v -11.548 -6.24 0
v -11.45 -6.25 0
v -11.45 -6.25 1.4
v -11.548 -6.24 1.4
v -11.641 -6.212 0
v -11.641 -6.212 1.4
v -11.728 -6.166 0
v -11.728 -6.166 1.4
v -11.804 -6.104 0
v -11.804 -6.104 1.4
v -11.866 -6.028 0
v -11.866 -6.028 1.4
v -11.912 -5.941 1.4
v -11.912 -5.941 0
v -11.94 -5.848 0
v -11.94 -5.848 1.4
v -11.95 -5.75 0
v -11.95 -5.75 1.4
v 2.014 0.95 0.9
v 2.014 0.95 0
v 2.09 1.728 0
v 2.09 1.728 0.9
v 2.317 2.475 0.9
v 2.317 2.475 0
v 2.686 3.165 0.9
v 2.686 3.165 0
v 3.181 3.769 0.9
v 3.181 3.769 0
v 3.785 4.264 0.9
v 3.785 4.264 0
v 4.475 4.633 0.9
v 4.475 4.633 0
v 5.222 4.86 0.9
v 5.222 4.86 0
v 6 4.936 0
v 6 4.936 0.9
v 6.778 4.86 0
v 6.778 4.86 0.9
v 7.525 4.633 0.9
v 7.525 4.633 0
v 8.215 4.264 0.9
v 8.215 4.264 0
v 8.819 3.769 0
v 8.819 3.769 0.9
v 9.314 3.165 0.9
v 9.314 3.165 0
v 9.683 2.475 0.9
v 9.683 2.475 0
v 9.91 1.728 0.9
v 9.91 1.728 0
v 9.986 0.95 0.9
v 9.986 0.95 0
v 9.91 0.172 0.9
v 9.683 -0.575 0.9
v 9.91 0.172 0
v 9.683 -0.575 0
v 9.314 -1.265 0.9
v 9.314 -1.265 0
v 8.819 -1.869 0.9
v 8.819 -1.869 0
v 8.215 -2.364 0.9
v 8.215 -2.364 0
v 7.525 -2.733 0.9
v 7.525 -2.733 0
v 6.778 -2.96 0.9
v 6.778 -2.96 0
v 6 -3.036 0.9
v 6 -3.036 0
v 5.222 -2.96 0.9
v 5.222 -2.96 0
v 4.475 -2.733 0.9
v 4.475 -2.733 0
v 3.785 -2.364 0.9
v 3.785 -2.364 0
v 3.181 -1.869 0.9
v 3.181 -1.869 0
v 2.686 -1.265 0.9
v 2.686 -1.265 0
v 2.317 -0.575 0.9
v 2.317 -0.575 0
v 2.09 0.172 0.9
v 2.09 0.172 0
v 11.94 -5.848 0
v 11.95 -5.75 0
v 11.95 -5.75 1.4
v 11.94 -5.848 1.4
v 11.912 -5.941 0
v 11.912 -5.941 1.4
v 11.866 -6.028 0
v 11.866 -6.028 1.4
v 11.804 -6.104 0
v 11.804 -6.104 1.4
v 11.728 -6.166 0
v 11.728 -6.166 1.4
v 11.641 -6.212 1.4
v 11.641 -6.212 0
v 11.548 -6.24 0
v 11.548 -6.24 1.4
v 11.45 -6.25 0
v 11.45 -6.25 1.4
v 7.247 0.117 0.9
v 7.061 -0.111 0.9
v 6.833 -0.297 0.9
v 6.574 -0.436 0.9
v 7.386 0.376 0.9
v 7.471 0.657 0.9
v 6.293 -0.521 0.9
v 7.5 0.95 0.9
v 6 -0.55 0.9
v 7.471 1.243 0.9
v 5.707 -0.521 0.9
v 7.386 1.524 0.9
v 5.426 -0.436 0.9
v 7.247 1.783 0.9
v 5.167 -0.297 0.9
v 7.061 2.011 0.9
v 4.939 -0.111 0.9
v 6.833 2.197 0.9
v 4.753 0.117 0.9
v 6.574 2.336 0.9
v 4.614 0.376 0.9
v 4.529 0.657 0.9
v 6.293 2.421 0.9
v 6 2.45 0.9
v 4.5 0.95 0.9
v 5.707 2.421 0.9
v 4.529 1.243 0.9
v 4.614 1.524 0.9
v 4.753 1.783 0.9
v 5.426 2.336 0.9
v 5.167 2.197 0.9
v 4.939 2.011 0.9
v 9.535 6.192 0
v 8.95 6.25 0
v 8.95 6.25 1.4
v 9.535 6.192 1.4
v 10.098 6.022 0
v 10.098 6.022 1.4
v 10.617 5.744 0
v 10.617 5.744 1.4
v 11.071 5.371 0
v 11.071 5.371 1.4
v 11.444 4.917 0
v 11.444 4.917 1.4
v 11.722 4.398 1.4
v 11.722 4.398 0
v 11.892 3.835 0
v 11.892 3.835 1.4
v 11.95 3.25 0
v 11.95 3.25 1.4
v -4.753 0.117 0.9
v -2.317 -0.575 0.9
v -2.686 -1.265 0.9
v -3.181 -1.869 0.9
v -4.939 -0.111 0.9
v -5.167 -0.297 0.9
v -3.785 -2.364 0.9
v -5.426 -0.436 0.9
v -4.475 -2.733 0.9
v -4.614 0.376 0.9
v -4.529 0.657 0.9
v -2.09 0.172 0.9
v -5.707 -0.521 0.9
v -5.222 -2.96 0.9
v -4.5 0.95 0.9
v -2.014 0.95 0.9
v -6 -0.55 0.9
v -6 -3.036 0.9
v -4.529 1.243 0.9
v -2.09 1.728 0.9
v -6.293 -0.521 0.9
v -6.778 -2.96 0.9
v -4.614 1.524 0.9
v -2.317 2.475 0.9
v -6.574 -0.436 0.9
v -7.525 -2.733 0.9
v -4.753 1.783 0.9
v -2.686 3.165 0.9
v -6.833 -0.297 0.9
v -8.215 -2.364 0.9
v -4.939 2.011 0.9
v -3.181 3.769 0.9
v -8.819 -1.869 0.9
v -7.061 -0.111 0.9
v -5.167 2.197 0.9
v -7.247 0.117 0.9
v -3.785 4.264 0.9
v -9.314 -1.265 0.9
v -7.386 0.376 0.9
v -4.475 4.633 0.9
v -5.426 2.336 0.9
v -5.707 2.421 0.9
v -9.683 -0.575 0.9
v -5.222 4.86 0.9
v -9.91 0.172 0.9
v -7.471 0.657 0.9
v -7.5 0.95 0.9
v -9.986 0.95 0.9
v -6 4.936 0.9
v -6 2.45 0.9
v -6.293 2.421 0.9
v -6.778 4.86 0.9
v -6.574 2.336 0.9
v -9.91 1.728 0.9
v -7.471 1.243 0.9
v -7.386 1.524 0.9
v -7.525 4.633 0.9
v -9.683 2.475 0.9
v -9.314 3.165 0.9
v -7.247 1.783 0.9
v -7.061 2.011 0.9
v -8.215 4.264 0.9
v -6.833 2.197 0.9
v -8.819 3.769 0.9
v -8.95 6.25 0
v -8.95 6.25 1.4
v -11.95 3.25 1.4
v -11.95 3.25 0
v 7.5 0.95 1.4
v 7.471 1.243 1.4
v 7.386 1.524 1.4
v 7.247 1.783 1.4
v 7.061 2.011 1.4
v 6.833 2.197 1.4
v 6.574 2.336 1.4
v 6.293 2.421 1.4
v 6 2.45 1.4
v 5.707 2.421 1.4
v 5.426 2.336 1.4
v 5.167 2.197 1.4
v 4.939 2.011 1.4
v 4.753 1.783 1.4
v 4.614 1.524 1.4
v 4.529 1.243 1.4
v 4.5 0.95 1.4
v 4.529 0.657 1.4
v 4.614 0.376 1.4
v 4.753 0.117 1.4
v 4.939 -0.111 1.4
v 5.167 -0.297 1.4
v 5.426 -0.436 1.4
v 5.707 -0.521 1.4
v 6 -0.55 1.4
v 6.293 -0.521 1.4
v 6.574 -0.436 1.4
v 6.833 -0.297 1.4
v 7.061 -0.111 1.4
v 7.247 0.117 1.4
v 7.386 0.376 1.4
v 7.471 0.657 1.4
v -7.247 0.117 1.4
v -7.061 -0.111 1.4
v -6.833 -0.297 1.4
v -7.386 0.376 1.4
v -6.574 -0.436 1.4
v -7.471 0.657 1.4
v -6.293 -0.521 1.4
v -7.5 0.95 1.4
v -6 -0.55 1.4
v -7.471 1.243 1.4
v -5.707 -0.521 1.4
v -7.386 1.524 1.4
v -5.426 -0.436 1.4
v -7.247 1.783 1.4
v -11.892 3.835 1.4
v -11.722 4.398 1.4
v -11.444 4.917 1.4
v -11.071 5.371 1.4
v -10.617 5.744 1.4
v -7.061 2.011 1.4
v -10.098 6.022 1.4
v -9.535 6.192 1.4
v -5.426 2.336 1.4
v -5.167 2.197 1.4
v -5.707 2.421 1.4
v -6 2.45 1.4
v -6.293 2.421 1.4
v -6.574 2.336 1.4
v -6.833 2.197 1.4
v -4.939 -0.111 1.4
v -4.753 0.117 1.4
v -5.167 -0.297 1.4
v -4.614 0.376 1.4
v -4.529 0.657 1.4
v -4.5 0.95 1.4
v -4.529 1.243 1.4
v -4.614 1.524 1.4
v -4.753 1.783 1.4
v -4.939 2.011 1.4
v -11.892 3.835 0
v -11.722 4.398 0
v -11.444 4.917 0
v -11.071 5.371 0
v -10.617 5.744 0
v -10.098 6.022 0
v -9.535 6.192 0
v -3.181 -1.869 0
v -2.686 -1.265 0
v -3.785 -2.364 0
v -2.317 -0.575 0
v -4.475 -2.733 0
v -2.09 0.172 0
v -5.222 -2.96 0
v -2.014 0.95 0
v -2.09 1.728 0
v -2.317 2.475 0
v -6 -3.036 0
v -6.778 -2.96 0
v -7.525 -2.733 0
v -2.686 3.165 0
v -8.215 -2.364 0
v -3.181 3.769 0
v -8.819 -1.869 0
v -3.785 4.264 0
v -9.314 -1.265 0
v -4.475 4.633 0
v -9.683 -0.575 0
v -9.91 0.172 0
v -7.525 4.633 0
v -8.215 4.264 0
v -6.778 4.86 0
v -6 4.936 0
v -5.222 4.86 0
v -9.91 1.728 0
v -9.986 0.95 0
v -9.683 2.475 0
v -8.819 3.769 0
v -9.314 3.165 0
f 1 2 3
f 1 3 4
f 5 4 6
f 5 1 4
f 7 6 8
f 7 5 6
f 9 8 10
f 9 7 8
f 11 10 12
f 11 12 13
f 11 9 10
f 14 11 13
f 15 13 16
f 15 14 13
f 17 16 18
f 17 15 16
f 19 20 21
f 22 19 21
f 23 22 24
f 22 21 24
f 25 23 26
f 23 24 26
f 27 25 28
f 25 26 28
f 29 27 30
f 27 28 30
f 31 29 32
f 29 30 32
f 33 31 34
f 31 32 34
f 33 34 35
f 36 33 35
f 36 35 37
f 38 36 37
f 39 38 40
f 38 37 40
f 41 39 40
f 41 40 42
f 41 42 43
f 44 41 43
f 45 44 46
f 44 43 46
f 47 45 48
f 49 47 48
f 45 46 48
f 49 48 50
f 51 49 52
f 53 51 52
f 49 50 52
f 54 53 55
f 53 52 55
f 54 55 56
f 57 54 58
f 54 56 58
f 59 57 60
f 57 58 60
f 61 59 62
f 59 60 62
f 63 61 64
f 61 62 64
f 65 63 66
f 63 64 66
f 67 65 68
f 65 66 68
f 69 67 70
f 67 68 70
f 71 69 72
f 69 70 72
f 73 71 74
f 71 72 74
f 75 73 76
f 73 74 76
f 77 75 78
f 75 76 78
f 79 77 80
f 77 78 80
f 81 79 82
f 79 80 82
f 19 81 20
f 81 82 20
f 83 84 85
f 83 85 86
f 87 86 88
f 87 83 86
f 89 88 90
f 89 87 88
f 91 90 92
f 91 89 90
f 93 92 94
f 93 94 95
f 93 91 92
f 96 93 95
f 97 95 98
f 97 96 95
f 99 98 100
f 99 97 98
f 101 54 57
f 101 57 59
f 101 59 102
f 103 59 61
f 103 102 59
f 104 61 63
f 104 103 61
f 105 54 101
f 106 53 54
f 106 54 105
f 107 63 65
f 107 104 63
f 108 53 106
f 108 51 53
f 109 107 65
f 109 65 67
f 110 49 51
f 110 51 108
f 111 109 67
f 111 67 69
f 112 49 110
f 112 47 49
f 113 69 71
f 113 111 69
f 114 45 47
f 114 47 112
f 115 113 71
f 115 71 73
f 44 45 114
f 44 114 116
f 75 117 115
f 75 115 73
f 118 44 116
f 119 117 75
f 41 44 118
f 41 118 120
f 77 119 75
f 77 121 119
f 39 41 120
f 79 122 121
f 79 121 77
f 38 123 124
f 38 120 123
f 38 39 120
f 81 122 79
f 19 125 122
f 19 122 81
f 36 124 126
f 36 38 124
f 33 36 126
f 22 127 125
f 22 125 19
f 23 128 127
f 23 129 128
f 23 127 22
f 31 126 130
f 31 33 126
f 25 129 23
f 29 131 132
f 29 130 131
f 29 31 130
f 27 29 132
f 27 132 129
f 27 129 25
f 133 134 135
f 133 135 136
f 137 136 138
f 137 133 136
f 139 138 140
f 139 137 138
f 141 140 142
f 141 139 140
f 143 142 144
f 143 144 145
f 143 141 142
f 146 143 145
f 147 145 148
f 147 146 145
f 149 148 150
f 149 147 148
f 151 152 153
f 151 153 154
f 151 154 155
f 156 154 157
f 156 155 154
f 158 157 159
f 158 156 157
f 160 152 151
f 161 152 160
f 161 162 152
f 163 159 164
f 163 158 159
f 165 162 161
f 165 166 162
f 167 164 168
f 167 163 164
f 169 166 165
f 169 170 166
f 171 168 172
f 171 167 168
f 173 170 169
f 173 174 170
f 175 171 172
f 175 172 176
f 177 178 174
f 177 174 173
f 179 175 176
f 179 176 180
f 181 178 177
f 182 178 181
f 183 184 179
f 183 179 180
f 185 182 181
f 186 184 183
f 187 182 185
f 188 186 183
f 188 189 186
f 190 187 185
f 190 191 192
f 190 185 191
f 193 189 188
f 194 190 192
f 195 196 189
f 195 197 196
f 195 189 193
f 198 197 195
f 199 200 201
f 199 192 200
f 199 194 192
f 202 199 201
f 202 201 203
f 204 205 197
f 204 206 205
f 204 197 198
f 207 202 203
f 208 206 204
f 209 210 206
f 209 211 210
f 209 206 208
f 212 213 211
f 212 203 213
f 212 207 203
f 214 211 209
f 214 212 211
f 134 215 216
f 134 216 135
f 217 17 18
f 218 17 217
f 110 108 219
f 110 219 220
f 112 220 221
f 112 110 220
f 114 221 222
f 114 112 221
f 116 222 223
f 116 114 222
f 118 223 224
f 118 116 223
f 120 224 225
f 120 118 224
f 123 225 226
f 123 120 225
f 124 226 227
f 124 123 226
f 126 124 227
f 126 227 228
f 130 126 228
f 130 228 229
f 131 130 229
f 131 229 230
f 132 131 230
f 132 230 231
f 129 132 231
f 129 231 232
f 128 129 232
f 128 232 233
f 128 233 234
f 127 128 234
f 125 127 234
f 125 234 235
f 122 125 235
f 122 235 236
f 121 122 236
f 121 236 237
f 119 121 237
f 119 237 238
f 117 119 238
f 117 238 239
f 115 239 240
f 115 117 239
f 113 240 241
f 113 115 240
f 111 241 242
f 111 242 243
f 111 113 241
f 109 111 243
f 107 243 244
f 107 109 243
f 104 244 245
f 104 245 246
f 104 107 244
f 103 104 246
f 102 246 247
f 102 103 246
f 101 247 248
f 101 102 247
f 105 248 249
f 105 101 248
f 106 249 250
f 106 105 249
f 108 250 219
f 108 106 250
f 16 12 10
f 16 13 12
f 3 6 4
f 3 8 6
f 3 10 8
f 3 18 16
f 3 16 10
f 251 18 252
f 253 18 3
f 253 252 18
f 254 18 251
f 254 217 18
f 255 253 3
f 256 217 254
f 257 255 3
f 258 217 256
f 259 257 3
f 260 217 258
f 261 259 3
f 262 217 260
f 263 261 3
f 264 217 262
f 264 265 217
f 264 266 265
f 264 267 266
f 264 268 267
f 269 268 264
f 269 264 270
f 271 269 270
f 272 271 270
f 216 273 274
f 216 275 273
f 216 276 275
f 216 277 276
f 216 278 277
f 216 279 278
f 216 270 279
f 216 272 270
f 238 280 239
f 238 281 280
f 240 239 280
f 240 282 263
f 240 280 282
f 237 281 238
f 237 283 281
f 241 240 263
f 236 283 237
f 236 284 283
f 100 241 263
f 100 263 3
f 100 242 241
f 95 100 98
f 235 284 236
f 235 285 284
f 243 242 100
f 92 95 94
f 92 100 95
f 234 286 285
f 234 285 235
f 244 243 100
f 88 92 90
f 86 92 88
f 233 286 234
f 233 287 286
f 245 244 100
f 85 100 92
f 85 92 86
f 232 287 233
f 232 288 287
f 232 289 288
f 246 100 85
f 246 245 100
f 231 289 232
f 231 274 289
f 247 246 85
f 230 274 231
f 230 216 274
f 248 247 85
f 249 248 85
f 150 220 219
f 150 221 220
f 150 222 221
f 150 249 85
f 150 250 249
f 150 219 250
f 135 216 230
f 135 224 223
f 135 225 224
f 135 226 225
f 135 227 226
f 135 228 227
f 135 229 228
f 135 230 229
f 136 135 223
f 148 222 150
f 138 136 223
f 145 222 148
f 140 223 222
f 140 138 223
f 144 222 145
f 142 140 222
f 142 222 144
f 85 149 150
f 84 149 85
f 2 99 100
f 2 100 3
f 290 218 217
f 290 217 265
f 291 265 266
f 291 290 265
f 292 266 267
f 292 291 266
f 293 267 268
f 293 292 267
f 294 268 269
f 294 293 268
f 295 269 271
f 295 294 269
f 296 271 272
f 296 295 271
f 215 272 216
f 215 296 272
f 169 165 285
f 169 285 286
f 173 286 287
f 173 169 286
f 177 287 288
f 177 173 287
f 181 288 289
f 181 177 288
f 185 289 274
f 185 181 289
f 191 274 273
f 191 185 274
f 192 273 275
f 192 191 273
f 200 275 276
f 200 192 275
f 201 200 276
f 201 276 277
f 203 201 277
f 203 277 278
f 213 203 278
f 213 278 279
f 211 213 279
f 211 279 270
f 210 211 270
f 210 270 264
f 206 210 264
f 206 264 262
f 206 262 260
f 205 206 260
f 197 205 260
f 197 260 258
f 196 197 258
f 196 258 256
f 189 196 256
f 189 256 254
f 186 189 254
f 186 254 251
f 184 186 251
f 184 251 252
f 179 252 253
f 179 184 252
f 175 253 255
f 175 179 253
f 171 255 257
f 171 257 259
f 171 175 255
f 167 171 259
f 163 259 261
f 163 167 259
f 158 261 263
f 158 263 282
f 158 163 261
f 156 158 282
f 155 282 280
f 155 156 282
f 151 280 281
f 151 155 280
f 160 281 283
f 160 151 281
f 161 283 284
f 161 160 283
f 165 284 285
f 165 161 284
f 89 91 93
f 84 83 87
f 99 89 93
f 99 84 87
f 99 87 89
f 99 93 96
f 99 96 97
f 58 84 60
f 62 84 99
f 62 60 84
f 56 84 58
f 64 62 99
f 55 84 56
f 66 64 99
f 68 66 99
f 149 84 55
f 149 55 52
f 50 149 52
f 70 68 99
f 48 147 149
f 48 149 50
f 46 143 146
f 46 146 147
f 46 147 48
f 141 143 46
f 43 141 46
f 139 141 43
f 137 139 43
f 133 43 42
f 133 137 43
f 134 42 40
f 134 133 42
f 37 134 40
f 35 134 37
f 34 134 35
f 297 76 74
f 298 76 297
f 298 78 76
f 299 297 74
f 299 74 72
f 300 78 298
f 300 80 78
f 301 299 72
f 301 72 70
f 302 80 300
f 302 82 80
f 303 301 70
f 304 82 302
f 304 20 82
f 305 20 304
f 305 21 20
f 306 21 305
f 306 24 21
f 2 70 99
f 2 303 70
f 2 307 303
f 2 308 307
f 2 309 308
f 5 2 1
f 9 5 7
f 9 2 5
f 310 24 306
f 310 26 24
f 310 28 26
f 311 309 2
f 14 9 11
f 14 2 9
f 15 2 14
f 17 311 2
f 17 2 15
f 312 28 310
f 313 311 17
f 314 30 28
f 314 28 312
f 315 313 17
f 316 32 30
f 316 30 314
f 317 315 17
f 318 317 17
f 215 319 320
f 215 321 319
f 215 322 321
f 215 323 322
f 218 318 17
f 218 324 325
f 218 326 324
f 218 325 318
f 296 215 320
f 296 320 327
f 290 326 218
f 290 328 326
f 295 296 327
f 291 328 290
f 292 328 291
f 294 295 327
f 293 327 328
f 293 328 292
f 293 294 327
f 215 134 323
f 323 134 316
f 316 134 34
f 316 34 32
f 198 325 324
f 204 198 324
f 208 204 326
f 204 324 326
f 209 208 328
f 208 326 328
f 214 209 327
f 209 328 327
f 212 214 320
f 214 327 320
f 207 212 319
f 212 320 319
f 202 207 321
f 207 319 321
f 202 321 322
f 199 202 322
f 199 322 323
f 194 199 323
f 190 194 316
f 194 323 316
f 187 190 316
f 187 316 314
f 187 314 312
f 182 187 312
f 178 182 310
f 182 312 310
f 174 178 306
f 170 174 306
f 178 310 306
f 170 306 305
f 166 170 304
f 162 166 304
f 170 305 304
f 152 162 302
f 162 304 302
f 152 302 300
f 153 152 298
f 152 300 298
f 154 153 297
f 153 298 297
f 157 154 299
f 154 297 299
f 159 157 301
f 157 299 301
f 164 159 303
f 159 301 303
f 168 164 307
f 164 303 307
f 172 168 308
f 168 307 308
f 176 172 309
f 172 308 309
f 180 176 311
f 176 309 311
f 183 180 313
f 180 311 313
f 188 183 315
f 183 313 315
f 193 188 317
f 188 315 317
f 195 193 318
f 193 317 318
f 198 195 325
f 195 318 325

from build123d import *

# Parameters (mm, degrees)
SKICA1_W                 = 1.7
SKICA1_H                 = 7.8
SKICA1_R                 = 1.5
P_IDAT_VYSUNUT_M3_DEPTH  = 1.4
SKICA3_R                 = 3.986213299
ODEBRAT_VYSUNUT_M1_DEPTH = 0.9
SKICA7_W                 = 1.7
SKICA7_H                 = 7.8
P_IDAT_VYSUNUT_M5_DEPTH  = 1.4


with BuildPart() as part:
    # Skica1 → Přidat vysunutím3 (new body)
    with BuildSketch(Plane.XY):
        with BuildLine():
            Line((-11.45, -6.25), (11.45, -6.25))
            ThreePointArc((11.45, -6.25), (11.803553391, -6.103553391), (11.95, -5.75))
            Line((11.95, -5.75), (11.95, 3.25))
            ThreePointArc((11.95, 3.25), (11.071320344, 5.371320344), (8.95, 6.25))
            Line((8.95, 6.25), (-8.95, 6.25))
            ThreePointArc((-8.95, 6.25), (-11.071320344, 5.371320344), (-11.95, 3.25))
            Line((-11.95, 3.25), (-11.95, -5.75))
            ThreePointArc((-11.95, -5.75), (-11.803553391, -6.103553391), (-11.45, -6.25))
        make_face()
        Rectangle(SKICA1_W, SKICA1_H, mode=Mode.SUBTRACT)
        with Locations((-6, 0.95)):
            Circle(SKICA1_R, mode=Mode.SUBTRACT)
        with Locations((6, 0.95)):
            Circle(SKICA1_R, mode=Mode.SUBTRACT)
    extrude(amount=P_IDAT_VYSUNUT_M3_DEPTH)

    # Skica3 → Odebrat vysunutím1 (cut)
    with BuildSketch(Plane(origin=(0, 0, 0), x_dir=(-1, 0, 0), z_dir=(0, 0, -1))):
        with Locations((-6, 0.95)):
            Circle(SKICA3_R)
        with Locations((6, 0.95)):
            Circle(SKICA3_R)
    extrude(amount=-ODEBRAT_VYSUNUT_M1_DEPTH, mode=Mode.SUBTRACT)

    # Skica7 → Přidat vysunutím5 (add)
    with BuildSketch(Plane(origin=(0, 0, 0), x_dir=(-1, 0, 0), z_dir=(0, 0, -1))):
        Rectangle(SKICA7_W, SKICA7_H)
    extrude(amount=-P_IDAT_VYSUNUT_M5_DEPTH)


solid = part.part
